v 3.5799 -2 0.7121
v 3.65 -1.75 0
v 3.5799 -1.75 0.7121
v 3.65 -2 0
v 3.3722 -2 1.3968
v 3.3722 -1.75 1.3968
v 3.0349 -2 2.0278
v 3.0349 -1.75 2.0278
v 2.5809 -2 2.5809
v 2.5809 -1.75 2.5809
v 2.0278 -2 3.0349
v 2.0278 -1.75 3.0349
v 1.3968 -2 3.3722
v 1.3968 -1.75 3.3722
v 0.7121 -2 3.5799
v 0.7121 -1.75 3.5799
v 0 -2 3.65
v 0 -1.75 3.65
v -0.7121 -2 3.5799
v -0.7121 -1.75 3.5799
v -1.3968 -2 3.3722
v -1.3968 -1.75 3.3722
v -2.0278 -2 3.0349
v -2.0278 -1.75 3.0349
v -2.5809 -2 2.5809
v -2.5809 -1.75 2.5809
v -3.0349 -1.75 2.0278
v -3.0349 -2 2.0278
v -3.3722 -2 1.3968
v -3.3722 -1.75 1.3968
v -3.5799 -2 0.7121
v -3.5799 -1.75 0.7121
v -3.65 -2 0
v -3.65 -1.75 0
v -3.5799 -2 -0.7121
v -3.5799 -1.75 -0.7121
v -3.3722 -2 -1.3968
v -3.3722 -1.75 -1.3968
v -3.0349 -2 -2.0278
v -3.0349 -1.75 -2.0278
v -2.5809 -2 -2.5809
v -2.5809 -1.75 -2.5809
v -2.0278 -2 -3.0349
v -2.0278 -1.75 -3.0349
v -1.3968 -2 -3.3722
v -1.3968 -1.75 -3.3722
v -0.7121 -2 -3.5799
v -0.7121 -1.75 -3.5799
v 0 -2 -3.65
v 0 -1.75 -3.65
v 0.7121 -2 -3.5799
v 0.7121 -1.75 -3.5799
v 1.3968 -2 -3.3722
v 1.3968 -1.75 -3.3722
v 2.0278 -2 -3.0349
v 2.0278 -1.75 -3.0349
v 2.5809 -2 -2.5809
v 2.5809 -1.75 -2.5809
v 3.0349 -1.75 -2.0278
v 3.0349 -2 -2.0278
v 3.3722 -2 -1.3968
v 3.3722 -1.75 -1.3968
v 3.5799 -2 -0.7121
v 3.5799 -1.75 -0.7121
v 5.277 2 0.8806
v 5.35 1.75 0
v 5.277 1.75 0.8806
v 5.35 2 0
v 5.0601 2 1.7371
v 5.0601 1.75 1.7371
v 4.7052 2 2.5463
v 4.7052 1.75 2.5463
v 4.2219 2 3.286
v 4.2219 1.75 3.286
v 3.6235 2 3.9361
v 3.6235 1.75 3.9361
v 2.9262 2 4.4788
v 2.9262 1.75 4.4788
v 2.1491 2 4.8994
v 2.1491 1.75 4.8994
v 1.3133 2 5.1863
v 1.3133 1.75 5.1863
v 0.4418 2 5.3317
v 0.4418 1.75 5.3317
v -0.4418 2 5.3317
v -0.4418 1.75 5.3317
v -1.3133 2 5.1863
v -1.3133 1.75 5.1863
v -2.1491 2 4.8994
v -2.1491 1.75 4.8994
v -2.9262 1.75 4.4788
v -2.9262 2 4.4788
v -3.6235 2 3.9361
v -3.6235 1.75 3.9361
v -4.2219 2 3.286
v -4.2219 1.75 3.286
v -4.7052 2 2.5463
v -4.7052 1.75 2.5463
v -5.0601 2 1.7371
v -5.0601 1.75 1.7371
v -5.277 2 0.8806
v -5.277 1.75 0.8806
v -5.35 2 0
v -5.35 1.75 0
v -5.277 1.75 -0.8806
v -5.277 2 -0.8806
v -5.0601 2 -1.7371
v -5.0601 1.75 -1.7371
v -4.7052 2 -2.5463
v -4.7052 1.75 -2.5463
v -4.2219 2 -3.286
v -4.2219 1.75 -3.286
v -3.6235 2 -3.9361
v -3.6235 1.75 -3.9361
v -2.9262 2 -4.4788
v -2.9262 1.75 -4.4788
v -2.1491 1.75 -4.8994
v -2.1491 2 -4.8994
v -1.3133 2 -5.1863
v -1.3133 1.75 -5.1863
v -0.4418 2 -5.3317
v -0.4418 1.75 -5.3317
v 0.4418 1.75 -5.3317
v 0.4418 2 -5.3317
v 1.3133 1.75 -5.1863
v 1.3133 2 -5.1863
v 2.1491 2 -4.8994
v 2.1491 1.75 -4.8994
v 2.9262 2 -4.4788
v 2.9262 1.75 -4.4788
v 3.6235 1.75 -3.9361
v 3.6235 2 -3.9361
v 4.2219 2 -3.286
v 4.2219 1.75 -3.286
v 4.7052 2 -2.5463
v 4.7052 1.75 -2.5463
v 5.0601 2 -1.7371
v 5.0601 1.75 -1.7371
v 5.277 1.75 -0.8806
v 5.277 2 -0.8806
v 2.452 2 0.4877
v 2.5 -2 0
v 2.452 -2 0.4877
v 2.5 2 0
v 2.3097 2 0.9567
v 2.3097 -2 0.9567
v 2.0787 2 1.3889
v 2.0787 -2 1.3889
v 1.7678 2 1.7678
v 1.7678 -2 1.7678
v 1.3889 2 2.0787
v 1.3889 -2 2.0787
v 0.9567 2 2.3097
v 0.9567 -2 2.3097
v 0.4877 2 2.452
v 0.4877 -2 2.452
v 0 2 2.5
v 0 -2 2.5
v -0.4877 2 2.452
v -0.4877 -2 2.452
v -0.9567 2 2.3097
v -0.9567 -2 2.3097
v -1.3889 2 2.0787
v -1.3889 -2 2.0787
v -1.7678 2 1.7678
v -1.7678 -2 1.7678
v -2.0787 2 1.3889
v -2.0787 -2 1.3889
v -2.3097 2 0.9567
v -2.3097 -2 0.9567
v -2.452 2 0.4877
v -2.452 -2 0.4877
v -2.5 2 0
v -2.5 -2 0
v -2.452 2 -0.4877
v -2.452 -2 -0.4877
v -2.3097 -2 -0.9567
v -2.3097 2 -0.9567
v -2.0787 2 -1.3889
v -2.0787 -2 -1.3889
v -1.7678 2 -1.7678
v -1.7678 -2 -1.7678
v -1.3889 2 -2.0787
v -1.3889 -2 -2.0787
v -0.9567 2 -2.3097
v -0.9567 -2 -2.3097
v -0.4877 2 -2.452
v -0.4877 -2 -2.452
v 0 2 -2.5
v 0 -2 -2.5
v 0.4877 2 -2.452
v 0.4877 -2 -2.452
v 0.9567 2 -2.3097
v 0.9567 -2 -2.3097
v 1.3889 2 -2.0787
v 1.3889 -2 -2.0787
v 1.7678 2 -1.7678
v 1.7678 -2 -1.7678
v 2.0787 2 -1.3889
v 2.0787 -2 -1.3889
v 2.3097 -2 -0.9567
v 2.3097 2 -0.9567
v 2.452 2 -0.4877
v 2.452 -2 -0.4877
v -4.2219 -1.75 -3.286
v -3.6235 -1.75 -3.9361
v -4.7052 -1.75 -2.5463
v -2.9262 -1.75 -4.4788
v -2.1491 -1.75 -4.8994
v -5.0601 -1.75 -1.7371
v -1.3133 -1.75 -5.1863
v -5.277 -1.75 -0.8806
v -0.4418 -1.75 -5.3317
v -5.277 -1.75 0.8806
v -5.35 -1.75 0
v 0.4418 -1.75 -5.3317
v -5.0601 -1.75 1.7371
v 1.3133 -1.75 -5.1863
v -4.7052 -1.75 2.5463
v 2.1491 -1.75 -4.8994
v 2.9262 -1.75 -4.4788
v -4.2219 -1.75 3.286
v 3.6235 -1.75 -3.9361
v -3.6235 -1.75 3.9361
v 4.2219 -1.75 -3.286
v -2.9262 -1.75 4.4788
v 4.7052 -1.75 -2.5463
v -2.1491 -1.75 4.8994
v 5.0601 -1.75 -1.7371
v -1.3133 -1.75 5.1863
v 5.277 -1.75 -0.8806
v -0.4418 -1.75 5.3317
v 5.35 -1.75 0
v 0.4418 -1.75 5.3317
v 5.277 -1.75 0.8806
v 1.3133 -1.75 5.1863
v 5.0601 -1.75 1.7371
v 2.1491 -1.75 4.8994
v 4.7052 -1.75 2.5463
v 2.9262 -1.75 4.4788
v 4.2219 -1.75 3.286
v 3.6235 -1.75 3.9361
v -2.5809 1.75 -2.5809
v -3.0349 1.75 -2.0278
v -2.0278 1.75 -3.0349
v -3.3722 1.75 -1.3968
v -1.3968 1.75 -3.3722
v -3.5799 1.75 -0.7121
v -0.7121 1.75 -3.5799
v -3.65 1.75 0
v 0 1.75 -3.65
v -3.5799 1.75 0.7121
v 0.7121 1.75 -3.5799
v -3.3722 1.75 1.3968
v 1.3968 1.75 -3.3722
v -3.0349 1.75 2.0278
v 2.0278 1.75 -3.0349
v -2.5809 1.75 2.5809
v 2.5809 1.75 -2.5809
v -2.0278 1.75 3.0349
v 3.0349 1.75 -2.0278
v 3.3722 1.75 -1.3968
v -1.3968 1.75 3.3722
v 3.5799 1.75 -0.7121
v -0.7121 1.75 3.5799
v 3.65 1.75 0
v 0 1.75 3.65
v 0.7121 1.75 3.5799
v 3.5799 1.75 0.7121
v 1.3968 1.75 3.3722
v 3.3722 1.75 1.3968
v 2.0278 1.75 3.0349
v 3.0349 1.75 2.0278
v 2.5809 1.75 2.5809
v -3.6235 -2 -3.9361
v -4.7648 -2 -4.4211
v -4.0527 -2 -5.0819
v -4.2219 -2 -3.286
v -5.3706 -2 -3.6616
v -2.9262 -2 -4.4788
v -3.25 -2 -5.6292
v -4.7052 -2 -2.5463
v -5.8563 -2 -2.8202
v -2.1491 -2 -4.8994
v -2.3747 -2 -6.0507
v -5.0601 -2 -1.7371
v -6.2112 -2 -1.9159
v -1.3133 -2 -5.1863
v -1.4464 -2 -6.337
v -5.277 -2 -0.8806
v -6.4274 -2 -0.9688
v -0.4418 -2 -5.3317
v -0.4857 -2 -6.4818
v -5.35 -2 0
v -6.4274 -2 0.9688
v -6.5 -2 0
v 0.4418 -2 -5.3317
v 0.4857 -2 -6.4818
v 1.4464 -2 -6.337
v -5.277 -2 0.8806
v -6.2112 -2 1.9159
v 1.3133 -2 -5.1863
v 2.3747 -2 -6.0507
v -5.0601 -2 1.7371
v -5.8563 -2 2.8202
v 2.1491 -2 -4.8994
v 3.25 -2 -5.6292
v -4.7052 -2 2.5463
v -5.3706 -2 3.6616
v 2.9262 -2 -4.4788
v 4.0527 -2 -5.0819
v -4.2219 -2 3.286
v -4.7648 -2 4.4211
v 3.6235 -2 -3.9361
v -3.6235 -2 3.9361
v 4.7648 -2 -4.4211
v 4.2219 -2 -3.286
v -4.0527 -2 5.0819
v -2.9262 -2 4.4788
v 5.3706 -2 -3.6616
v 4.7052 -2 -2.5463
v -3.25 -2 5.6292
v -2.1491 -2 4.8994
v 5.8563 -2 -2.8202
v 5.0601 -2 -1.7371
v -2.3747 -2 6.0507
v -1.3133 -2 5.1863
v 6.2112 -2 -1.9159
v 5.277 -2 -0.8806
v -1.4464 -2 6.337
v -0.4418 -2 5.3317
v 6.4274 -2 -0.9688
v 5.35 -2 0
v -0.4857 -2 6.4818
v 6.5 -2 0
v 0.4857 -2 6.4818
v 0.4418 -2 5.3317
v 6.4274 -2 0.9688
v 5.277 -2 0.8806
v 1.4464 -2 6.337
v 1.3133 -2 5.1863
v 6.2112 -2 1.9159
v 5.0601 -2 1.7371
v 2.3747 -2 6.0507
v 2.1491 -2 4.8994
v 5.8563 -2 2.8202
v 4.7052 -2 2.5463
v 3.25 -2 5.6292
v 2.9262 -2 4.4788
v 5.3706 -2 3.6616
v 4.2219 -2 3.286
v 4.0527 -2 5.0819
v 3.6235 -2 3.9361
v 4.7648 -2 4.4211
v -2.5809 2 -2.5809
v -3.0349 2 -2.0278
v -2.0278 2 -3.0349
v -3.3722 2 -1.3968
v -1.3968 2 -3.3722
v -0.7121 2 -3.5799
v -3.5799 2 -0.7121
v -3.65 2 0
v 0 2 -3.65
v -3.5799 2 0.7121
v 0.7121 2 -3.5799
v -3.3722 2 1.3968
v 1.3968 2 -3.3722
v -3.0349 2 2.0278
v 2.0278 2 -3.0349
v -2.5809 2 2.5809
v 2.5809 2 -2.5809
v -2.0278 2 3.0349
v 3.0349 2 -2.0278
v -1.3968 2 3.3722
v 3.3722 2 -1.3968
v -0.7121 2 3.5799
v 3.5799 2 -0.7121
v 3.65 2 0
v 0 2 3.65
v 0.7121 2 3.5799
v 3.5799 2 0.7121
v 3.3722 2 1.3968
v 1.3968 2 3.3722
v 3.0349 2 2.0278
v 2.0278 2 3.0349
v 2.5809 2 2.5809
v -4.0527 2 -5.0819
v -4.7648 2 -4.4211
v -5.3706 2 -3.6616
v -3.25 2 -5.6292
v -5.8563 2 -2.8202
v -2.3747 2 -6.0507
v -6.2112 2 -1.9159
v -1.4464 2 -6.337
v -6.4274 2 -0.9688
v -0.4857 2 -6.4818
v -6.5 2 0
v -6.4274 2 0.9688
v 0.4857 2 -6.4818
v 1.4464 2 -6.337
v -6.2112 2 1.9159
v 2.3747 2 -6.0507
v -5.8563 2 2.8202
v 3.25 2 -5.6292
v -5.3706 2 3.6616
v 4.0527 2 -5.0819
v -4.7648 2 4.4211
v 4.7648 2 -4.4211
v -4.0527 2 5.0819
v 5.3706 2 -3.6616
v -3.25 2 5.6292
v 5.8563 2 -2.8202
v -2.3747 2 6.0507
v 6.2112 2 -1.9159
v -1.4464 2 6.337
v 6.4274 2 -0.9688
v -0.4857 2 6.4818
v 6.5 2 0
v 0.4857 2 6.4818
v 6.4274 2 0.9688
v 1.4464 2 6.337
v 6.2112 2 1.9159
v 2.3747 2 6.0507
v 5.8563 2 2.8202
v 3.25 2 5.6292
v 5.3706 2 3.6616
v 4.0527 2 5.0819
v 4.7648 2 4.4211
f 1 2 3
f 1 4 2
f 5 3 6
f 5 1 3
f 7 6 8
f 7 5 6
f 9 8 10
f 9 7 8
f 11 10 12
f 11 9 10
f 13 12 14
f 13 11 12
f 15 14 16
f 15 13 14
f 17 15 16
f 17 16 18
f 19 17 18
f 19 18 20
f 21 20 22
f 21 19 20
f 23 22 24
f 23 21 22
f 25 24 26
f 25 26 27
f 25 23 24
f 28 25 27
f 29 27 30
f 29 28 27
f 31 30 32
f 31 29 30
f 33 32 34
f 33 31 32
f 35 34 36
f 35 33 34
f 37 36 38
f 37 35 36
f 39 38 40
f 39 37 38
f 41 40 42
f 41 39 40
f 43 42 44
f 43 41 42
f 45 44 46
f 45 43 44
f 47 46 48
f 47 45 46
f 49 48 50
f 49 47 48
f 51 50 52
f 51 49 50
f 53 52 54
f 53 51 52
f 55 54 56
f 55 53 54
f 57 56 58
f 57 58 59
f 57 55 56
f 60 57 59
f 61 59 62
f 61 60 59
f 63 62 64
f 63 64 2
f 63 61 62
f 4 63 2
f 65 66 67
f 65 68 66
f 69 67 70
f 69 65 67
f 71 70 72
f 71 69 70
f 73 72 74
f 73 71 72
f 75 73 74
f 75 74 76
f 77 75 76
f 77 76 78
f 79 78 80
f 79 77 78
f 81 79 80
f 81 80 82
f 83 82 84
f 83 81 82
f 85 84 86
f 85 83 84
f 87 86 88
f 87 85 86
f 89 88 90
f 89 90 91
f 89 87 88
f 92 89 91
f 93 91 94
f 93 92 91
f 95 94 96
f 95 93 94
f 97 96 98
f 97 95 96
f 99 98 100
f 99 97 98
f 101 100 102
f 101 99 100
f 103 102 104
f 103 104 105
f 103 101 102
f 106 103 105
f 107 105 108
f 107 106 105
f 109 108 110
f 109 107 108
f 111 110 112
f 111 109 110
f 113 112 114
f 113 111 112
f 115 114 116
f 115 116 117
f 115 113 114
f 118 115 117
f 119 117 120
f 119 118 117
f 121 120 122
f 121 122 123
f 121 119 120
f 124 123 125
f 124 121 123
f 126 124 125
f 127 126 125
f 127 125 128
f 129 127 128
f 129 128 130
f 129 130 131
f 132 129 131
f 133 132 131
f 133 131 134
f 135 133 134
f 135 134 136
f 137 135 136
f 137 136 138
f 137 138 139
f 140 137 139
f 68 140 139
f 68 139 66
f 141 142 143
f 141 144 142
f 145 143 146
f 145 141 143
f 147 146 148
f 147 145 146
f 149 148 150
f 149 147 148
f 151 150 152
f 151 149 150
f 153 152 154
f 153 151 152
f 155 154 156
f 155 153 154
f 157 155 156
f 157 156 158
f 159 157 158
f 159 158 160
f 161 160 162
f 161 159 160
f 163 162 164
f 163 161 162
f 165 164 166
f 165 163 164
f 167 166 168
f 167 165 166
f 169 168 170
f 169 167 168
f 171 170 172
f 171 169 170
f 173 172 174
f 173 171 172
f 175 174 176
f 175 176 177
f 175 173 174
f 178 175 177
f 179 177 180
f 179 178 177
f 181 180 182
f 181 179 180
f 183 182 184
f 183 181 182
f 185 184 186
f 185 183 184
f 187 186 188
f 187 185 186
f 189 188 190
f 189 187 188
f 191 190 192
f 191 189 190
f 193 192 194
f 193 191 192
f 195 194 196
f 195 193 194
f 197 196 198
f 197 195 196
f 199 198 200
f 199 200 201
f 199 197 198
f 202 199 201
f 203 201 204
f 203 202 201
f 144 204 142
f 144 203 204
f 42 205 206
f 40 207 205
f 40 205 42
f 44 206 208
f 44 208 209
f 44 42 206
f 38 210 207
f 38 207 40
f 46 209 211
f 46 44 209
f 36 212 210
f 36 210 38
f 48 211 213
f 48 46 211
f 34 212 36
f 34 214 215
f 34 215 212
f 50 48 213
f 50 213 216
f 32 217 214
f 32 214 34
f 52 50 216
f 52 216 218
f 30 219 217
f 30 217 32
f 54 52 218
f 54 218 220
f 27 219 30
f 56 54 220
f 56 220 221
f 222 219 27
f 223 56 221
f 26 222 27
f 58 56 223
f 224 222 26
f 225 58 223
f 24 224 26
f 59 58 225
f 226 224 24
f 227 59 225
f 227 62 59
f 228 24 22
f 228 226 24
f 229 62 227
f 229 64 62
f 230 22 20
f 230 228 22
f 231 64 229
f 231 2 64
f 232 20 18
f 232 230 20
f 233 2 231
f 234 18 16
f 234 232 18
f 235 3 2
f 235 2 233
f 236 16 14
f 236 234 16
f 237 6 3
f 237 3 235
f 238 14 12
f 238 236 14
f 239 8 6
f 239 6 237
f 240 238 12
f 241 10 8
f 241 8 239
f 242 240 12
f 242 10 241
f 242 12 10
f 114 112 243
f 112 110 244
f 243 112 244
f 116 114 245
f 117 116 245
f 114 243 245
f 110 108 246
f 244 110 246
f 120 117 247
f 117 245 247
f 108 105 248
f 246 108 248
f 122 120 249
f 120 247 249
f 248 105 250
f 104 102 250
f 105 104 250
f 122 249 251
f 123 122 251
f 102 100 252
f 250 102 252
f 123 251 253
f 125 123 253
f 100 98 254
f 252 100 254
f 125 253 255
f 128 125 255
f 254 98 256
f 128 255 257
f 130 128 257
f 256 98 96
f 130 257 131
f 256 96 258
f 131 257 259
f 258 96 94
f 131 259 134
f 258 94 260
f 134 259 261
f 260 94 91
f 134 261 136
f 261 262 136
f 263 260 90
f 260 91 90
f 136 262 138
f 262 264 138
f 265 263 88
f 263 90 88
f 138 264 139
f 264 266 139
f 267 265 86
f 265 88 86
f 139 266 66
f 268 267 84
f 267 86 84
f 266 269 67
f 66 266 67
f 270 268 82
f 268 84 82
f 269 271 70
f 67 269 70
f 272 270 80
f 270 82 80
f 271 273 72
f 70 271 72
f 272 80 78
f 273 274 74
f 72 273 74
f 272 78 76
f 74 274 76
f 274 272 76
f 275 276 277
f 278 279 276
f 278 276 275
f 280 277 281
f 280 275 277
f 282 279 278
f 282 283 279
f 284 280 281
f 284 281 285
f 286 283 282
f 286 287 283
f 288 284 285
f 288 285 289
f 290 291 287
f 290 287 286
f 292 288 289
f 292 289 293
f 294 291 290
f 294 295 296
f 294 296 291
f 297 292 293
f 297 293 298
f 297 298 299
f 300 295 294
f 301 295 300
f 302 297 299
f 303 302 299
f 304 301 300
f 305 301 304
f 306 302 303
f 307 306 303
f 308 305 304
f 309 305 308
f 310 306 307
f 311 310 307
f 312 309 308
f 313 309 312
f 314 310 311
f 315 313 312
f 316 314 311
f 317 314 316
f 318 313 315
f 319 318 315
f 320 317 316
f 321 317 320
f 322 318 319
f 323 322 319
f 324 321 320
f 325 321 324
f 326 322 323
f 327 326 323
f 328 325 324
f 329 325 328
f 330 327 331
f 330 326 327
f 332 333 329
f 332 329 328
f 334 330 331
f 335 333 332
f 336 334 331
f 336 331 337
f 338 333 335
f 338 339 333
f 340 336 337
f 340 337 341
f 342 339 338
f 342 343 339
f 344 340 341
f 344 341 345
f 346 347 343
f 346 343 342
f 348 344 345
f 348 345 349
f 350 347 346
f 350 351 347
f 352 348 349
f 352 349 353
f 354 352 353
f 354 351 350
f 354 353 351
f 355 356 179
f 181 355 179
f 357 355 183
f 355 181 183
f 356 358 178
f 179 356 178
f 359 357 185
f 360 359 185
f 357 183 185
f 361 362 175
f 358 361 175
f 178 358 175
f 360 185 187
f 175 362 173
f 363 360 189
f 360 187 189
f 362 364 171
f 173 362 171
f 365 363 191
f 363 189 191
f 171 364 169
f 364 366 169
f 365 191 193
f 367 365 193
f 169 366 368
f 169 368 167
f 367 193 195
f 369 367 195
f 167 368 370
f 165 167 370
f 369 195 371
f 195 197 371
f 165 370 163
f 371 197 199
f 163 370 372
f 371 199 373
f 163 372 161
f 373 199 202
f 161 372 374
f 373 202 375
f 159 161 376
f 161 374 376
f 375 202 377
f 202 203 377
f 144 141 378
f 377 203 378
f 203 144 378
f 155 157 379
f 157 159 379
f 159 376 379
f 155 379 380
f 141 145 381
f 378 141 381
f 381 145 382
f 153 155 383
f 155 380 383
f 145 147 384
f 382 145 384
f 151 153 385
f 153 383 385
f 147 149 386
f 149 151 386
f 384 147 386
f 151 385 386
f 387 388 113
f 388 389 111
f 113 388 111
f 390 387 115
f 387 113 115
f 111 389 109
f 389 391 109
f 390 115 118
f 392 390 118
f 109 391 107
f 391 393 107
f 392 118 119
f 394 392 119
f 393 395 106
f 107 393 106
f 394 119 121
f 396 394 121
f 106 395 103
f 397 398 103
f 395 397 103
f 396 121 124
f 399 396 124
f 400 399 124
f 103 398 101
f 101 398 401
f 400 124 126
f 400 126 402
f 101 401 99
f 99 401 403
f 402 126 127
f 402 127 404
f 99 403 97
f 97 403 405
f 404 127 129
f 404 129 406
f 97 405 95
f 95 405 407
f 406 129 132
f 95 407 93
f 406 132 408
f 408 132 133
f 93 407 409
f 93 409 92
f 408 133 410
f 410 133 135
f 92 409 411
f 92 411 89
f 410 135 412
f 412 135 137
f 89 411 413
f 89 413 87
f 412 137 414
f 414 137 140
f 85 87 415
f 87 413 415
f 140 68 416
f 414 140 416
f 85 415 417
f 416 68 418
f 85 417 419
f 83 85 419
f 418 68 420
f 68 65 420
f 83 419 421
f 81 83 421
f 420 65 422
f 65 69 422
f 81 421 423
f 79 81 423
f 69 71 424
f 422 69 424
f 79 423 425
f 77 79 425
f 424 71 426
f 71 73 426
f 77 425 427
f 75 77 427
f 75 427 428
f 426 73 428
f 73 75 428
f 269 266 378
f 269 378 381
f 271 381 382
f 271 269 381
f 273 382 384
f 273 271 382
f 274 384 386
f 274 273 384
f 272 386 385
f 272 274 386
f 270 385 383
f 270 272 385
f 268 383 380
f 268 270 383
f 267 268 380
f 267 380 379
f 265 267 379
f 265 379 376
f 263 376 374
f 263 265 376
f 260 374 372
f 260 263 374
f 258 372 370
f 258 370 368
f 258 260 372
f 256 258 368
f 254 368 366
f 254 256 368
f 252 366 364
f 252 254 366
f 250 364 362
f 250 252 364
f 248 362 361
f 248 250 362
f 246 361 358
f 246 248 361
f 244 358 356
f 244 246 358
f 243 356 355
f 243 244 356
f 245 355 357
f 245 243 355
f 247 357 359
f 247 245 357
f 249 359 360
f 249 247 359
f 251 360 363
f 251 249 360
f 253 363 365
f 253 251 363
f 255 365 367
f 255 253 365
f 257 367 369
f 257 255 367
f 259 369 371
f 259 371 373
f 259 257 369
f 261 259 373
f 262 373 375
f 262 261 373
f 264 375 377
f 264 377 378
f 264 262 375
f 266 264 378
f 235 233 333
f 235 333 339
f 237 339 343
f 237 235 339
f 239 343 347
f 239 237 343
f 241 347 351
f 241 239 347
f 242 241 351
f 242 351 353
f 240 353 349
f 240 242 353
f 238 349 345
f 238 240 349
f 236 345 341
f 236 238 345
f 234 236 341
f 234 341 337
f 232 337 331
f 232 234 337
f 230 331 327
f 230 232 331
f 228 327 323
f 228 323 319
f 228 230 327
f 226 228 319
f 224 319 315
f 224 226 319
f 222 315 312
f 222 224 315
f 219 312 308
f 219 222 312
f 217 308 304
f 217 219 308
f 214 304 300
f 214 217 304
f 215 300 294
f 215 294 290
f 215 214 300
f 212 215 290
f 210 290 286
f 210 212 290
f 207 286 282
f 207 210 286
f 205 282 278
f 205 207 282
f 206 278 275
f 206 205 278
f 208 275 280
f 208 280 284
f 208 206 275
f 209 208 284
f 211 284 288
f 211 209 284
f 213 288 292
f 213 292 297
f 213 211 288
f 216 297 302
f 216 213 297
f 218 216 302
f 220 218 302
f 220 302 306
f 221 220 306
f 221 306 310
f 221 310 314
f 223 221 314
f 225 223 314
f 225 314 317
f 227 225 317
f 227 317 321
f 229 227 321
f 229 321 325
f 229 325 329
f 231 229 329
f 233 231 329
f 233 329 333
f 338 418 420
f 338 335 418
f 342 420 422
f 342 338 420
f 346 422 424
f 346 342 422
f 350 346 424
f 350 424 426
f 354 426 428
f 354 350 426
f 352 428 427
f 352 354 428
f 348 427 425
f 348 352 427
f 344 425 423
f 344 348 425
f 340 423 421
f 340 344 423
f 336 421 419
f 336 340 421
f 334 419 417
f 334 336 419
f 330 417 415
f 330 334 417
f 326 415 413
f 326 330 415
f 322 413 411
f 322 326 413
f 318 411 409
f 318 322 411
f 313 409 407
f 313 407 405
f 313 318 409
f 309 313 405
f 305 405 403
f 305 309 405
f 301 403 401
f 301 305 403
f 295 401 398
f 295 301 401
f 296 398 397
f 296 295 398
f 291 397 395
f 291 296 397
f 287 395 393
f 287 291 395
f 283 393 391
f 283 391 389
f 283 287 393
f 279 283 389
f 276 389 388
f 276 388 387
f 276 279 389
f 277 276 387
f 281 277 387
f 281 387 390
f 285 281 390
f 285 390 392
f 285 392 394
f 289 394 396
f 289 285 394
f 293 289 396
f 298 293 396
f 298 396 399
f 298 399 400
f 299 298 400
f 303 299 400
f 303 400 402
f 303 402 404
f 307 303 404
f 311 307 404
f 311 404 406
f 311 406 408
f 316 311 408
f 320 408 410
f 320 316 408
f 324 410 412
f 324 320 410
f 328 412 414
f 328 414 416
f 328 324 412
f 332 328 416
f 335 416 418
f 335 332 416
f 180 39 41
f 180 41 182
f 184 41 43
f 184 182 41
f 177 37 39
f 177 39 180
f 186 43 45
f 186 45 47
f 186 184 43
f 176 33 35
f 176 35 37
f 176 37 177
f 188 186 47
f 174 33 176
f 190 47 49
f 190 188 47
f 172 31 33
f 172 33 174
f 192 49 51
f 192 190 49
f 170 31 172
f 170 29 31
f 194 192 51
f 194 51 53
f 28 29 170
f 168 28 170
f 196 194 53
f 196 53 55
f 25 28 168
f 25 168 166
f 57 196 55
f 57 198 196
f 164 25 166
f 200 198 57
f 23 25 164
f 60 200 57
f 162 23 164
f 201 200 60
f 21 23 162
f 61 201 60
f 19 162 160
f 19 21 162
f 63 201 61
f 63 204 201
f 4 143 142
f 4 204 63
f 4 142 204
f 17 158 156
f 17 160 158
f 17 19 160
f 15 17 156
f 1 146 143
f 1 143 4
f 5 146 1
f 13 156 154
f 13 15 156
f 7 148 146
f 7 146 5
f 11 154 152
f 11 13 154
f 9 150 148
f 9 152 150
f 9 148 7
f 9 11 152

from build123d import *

# Parameters (mm, degrees)
F1_R     = 6.5
F1_R_2   = 5.35
F2_DEPTH = 2
F3_R     = 3.65
F3_R_2   = 2.5
F4_DEPTH = 2
F5_R     = 5.35
F5_R_2   = 3.65
F6_DEPTH = 1.75


with BuildPart() as f2:
    # F1 (on Front) → F2 (new body, symmetric)
    with BuildSketch(Plane.XZ):
        Circle(F1_R)
        Circle(F1_R_2, mode=Mode.SUBTRACT)
    extrude(amount=F2_DEPTH, both=True)



with BuildPart() as f4:
    # F3 (on Front) → F4 (new body, symmetric)
    with BuildSketch(Plane.XZ):
        Circle(F3_R)
        Circle(F3_R_2, mode=Mode.SUBTRACT)
    extrude(amount=F4_DEPTH, both=True)


with BuildPart() as f2_1:
    add(f2.part)

    add(f4.part)  # F6 merges F4
    # F5 (on Front) → F6 (join, symmetric)
    with BuildSketch(Plane.XZ):
        Circle(F5_R)
        Circle(F5_R_2, mode=Mode.SUBTRACT)
    extrude(amount=F6_DEPTH, both=True)


solid = f2_1.part
